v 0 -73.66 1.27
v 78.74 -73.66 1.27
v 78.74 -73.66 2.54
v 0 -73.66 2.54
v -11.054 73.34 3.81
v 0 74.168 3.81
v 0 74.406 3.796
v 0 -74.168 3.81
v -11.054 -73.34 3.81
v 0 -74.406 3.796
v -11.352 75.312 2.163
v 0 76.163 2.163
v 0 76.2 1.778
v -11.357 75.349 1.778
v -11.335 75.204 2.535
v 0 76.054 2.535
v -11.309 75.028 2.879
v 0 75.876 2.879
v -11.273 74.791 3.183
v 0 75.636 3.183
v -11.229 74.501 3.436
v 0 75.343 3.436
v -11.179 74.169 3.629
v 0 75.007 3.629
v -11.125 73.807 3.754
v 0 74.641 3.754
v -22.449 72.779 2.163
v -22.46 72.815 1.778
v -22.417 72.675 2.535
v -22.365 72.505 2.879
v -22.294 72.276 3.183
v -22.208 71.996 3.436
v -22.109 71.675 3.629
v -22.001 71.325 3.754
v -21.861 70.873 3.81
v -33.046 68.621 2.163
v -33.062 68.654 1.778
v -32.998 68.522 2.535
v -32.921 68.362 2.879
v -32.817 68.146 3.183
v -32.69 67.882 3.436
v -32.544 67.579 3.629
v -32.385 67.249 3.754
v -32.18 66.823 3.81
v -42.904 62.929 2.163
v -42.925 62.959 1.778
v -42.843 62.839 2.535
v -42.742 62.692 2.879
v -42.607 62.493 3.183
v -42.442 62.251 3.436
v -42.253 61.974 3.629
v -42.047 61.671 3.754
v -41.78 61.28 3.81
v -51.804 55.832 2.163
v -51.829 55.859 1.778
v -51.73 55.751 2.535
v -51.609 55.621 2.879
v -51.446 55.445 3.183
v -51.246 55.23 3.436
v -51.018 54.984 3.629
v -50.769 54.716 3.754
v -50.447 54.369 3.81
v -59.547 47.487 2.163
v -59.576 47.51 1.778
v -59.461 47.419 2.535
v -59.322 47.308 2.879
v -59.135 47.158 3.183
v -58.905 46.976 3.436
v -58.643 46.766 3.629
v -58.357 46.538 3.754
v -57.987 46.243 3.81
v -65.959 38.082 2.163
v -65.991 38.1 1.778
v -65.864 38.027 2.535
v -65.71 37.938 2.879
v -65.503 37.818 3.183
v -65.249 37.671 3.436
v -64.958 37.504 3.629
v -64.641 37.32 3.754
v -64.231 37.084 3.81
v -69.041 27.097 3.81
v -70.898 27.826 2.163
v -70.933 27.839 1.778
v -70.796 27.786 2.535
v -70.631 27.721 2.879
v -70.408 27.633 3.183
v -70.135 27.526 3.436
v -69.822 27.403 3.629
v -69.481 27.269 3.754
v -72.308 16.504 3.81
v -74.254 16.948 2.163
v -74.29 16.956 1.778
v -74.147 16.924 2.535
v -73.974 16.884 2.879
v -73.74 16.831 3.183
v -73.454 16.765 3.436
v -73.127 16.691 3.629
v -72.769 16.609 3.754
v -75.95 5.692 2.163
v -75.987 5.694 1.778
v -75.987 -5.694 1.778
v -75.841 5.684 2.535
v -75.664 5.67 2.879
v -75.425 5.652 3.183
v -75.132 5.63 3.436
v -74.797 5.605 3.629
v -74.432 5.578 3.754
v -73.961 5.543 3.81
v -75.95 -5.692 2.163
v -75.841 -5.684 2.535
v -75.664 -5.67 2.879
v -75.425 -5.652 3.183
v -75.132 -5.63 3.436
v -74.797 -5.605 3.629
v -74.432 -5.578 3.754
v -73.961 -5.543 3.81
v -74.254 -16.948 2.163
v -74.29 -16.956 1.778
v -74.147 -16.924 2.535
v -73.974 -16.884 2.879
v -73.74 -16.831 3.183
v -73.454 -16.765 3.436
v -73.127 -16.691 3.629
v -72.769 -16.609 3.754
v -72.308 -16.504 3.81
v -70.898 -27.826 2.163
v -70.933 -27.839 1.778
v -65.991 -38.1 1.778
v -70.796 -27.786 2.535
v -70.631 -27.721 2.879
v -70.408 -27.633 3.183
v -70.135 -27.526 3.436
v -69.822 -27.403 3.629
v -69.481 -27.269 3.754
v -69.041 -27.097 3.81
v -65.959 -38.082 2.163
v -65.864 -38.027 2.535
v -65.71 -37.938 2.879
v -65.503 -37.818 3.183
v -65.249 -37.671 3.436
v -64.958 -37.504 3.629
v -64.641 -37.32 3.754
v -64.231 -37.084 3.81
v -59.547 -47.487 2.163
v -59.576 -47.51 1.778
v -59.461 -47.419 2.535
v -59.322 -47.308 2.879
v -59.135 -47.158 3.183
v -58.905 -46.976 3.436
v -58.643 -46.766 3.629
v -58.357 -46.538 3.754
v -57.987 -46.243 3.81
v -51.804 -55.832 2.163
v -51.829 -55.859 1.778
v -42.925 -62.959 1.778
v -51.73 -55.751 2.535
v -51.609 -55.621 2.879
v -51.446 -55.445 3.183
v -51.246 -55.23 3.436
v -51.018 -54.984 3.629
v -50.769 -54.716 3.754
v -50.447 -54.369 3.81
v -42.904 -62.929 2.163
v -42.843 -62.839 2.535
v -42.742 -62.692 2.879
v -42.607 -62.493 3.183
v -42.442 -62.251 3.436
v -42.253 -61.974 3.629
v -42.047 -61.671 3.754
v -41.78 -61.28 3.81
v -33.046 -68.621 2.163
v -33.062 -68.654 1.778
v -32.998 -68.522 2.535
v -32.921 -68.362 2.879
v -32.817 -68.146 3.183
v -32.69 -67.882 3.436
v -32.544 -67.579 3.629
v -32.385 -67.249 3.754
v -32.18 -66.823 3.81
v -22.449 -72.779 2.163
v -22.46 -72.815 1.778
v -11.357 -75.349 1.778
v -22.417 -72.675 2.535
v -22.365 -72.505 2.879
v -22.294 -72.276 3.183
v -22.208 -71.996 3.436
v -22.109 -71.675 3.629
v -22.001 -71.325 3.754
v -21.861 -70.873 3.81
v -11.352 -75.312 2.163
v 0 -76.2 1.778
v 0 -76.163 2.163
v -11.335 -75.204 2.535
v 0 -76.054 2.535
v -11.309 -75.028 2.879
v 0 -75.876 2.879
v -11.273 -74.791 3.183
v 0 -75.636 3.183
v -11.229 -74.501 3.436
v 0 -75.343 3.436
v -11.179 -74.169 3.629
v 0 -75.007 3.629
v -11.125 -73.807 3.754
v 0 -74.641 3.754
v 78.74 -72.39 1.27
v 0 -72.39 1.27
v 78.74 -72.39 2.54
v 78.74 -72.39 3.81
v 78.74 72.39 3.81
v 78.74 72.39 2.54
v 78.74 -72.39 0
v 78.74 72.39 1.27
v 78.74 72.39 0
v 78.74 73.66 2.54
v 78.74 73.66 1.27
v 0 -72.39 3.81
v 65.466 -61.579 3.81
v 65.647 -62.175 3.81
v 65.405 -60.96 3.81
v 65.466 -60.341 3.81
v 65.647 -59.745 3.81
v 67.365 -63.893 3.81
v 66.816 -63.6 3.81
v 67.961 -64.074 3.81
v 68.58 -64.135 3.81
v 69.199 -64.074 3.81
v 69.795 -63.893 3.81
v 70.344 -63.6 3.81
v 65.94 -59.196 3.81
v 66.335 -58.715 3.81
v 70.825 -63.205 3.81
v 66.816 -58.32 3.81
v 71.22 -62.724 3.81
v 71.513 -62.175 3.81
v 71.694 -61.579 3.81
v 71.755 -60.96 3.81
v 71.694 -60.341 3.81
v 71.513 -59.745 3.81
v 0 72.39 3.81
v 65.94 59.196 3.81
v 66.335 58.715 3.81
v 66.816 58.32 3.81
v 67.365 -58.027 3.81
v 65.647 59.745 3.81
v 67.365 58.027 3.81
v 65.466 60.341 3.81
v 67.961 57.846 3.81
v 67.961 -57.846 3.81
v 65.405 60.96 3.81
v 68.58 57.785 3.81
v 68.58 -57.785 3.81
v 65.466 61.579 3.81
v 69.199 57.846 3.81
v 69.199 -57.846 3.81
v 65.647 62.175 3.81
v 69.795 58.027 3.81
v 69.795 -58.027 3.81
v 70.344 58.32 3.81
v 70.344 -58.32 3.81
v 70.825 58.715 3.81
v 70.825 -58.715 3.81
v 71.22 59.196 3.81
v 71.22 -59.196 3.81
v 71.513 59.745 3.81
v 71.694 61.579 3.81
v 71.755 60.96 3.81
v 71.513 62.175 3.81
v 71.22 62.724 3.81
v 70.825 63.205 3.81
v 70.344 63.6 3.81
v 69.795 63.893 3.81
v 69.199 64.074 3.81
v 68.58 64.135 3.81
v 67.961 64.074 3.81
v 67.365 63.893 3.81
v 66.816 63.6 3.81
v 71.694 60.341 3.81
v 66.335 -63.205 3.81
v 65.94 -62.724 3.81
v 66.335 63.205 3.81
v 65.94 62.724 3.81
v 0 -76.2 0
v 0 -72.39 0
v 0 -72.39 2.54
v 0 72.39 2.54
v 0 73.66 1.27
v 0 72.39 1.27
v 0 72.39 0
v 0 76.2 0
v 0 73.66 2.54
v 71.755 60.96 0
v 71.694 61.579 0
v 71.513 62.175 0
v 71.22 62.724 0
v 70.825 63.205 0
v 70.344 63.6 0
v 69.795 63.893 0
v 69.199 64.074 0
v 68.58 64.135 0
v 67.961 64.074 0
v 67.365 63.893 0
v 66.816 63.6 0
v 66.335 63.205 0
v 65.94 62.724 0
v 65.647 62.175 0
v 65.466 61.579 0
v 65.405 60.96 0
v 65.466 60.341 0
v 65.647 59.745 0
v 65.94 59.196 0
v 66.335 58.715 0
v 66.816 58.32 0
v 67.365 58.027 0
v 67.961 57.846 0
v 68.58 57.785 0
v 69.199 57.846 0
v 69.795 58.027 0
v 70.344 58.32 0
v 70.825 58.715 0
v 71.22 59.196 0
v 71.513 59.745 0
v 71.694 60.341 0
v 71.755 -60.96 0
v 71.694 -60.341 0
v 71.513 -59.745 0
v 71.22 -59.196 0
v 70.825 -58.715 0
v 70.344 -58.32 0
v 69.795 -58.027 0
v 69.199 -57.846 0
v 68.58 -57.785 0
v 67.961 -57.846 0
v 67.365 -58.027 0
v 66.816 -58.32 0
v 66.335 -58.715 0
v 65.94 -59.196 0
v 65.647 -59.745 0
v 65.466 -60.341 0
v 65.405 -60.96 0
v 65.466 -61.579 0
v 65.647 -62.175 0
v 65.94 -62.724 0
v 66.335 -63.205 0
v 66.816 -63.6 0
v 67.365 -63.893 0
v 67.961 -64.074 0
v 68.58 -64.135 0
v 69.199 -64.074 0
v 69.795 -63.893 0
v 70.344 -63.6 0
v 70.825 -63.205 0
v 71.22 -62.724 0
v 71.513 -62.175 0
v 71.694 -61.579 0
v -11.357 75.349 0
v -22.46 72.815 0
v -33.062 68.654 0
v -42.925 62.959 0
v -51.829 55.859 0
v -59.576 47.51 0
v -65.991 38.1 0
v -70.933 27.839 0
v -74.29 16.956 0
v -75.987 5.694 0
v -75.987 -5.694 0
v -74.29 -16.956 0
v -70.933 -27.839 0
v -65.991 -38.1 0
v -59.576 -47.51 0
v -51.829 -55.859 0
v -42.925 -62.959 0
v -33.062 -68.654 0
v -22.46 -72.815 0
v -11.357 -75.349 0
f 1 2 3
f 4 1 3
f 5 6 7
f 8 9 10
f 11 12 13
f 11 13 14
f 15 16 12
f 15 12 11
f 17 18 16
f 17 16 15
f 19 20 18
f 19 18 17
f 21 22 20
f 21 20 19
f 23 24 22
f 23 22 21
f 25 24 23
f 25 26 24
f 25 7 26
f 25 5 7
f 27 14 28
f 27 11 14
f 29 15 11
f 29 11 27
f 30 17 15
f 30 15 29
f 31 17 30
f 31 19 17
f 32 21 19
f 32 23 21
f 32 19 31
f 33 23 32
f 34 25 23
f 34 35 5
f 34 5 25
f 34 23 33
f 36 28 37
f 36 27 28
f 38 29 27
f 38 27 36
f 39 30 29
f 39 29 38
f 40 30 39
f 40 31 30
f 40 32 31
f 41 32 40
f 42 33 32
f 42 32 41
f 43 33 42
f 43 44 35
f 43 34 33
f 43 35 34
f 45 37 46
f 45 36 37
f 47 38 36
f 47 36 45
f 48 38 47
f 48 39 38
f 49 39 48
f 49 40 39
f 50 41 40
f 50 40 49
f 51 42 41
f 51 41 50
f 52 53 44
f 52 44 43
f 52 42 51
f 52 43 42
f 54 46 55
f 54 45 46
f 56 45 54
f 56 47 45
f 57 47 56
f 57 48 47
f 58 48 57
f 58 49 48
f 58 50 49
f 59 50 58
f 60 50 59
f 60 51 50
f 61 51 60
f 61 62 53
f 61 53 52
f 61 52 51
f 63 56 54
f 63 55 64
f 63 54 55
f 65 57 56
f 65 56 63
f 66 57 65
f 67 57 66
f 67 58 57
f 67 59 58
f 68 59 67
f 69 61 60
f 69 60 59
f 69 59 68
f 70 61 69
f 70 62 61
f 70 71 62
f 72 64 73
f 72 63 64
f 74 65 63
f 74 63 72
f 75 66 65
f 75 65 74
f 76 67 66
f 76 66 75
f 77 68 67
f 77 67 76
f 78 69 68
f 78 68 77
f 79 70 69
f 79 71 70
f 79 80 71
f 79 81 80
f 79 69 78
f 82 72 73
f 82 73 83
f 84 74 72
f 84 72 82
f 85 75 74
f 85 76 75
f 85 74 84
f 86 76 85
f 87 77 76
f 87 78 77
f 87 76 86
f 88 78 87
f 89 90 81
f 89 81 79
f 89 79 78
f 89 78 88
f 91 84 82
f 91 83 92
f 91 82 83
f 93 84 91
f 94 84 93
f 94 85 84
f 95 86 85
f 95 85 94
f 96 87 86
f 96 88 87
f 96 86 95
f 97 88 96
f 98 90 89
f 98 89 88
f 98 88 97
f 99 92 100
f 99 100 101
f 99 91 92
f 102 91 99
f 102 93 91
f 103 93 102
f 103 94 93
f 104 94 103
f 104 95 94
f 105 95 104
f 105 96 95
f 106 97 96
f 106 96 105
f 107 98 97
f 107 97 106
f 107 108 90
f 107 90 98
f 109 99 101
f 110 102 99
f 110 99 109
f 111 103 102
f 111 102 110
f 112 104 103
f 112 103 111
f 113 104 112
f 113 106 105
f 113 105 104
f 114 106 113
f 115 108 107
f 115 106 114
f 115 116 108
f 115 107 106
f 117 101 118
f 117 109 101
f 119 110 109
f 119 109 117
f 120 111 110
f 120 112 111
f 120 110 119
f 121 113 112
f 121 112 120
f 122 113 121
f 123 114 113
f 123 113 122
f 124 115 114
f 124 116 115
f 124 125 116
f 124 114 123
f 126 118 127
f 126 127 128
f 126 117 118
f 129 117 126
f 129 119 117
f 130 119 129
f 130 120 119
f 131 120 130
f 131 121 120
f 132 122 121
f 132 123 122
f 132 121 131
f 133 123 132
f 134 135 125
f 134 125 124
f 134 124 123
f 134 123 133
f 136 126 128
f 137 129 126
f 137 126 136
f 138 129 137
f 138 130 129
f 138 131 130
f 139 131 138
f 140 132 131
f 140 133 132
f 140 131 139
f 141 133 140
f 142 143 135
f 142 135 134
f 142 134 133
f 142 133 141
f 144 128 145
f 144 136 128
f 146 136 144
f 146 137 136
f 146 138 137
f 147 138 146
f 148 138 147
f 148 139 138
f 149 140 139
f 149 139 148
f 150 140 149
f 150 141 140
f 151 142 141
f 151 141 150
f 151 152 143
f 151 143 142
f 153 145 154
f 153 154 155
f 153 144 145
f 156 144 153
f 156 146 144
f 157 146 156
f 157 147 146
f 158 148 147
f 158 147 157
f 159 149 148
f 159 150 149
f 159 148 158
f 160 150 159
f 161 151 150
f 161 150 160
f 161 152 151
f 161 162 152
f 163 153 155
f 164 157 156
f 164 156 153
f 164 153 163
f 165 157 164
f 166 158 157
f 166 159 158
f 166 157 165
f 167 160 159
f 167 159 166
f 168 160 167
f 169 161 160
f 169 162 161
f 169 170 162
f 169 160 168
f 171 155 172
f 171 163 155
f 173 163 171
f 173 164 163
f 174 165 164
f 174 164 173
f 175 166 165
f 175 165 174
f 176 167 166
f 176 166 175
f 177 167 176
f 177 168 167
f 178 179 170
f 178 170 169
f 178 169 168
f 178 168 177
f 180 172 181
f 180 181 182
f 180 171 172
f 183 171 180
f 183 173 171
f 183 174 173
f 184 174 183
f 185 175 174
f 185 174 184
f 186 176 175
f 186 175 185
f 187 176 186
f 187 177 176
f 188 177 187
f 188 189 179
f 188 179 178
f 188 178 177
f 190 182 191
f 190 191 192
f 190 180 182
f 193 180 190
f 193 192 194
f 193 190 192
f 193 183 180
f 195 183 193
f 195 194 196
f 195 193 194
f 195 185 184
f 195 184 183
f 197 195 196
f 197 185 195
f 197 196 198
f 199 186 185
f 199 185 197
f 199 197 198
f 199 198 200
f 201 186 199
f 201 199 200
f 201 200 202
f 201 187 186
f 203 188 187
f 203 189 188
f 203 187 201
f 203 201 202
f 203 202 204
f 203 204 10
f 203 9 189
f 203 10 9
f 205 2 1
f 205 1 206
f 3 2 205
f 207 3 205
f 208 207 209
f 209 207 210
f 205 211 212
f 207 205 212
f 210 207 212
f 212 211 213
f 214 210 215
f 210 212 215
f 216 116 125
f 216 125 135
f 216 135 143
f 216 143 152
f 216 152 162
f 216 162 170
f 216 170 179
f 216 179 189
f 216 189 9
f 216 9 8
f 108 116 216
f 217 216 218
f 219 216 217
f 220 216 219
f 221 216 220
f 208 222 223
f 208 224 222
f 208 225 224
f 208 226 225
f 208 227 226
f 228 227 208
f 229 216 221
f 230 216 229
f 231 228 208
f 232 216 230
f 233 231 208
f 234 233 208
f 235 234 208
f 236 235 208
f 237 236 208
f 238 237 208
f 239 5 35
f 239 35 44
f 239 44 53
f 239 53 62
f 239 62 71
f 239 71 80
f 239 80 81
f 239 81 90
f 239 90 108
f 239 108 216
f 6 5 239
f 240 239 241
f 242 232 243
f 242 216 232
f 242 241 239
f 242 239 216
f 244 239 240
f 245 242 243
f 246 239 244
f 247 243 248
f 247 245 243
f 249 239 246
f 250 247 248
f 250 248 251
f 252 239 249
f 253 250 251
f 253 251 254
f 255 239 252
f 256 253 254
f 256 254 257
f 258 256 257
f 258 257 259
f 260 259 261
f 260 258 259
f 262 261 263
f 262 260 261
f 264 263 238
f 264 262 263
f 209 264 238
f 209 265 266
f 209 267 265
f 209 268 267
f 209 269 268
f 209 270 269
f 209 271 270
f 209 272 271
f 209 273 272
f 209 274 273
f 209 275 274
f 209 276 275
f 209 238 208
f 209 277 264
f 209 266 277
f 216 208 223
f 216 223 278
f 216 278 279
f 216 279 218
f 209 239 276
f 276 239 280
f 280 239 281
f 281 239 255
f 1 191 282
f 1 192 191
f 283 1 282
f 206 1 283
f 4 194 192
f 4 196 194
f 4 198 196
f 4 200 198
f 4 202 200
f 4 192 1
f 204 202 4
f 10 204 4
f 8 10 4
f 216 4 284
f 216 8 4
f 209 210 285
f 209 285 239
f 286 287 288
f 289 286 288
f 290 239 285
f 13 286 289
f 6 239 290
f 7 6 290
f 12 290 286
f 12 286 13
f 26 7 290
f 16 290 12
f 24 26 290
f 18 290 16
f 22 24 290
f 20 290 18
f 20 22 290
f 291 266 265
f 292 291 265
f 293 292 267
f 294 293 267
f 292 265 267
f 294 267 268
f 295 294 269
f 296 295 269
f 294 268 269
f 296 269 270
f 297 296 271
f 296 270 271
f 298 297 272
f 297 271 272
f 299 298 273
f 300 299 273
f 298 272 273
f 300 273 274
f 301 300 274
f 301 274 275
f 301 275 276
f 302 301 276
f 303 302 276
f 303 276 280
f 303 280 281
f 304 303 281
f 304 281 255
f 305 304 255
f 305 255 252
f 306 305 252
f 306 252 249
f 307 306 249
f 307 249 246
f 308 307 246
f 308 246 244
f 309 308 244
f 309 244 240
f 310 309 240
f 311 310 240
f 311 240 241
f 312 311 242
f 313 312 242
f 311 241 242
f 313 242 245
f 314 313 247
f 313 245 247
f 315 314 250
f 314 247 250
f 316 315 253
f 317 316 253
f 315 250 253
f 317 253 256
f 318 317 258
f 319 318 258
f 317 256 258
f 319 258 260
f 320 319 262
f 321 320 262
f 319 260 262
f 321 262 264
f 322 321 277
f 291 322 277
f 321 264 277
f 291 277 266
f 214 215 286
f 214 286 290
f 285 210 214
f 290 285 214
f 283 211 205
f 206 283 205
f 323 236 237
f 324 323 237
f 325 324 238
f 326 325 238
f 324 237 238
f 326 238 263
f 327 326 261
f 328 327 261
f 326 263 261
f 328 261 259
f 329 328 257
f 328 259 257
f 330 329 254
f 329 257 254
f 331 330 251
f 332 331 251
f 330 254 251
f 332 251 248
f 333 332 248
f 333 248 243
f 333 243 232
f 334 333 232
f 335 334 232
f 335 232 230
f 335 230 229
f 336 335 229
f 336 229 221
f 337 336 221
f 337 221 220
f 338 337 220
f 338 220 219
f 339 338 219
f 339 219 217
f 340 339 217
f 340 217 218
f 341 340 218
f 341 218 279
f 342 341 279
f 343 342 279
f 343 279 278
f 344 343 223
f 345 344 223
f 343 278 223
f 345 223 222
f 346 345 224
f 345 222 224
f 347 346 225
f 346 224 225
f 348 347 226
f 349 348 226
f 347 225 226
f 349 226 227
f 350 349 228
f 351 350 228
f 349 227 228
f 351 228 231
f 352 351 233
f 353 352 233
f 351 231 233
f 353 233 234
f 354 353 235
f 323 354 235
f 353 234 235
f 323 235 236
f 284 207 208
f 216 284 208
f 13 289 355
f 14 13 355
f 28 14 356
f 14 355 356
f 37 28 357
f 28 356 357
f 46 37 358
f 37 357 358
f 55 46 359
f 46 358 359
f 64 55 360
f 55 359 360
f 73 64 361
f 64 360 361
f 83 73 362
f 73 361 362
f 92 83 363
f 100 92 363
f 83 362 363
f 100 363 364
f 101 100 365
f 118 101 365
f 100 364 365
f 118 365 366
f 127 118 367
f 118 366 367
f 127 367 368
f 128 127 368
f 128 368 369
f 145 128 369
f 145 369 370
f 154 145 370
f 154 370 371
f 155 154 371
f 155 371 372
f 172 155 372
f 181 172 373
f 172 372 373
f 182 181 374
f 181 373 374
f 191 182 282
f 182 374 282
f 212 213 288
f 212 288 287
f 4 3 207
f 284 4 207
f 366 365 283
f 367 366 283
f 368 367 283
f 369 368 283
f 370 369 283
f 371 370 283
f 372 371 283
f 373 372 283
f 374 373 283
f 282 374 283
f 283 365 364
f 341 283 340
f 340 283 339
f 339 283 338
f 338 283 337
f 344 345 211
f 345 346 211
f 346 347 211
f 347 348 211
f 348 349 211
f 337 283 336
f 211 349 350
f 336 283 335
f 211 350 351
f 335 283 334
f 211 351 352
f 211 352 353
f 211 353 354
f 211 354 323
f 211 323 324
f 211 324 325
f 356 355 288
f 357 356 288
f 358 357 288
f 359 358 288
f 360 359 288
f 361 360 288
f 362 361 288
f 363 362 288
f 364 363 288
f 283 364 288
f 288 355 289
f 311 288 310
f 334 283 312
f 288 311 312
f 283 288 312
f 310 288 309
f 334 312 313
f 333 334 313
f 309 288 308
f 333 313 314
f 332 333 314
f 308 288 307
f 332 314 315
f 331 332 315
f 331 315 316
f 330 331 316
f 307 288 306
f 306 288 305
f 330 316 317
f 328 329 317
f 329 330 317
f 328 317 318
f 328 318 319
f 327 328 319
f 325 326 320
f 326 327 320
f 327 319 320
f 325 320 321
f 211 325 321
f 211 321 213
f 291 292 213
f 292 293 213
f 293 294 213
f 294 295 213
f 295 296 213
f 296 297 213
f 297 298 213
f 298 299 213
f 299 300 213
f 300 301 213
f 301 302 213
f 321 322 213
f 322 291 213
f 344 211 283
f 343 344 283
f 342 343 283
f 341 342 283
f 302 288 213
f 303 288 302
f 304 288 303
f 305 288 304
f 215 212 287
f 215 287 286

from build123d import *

# Parameters (mm, degrees)
F1_DEPTH = 3.81
F2_W     = 2.54
F2_H     = 3.81
F3_DEPTH = 78.74
F4_W     = 1.27
F4_H     = 1.27
F5_DEPTH = 78.74
F6_R     = 3.175
F7_DEPTH = 25.4
F8_R     = 2.032


# Not quite as in the source:
# - a feature names something its author has since deleted; it is built from what else it names


with BuildPart() as f1:
    # F0 (on Top) → F1 (new body)
    with BuildSketch(Plane.XY):
        with BuildLine():
            Line((0, -76.2), (0, 76.2))
            ThreePointArc((0, 76.2), (-76.2, 0), (0, -76.2))
        make_face()
        with BuildLine():
            ThreePointArc((0, -76.2), (53.8815367264, -53.8815367264), (76.2, 0))
            ThreePointArc((76.2, 0), (53.8815367264, 53.8815367264), (0, 76.2))
            Line((0, 76.2), (0, -76.2))
        make_face()
        with BuildLine():
            ThreePointArc((0, 76.2), (53.8815367264, 53.8815367264), (76.2, 0))
            ThreePointArc((76.2, 0), (53.8815367264, -53.8815367264), (0, -76.2))
            Line((0, -76.2), (78.74, -76.2))
            Line((78.74, -76.2), (78.74, 76.2))
            Line((78.74, 76.2), (0, 76.2))
        make_face()
    extrude(amount=F1_DEPTH)

    # F2 (on face) → F3 (cut)
    with BuildSketch(Plane.YZ.offset(78.74)):
        with Locations((-74.93, 1.905)):
            Rectangle(F2_W, F2_H)
        with Locations((74.93, 1.905)):
            Rectangle(F2_W, F2_H)
    extrude(amount=-F3_DEPTH, mode=Mode.SUBTRACT)

    # F4 (on face) → F5 (cut)
    with BuildSketch(Plane.YZ.offset(78.74)):
        with Locations((-73.025, 3.175)):
            Rectangle(F4_W, F4_H)
        with Locations((-73.025, 0.635)):
            Rectangle(F4_W, F4_H)
        with Locations((73.025, 3.175)):
            Rectangle(F4_W, F4_H)
        with Locations((73.025, 0.635)):
            Rectangle(F4_W, F4_H)
    extrude(amount=-F5_DEPTH, mode=Mode.SUBTRACT)

    # F6 (on face) → F7 (cut)
    with BuildSketch(Plane.XY.offset(3.81)):
        with Locations((68.58, 60.96)):
            Circle(F6_R)
        with Locations((68.58, -60.96)):
            Circle(F6_R)
    extrude(amount=-F7_DEPTH, mode=Mode.SUBTRACT)

    # F8
    f8_edges = [f1.edges().sort_by_distance(p)[0] for p in [
        (-76.2, 0, 3.81),
    ]]
    fillet(f8_edges, radius=F8_R)


solid = f1.part
